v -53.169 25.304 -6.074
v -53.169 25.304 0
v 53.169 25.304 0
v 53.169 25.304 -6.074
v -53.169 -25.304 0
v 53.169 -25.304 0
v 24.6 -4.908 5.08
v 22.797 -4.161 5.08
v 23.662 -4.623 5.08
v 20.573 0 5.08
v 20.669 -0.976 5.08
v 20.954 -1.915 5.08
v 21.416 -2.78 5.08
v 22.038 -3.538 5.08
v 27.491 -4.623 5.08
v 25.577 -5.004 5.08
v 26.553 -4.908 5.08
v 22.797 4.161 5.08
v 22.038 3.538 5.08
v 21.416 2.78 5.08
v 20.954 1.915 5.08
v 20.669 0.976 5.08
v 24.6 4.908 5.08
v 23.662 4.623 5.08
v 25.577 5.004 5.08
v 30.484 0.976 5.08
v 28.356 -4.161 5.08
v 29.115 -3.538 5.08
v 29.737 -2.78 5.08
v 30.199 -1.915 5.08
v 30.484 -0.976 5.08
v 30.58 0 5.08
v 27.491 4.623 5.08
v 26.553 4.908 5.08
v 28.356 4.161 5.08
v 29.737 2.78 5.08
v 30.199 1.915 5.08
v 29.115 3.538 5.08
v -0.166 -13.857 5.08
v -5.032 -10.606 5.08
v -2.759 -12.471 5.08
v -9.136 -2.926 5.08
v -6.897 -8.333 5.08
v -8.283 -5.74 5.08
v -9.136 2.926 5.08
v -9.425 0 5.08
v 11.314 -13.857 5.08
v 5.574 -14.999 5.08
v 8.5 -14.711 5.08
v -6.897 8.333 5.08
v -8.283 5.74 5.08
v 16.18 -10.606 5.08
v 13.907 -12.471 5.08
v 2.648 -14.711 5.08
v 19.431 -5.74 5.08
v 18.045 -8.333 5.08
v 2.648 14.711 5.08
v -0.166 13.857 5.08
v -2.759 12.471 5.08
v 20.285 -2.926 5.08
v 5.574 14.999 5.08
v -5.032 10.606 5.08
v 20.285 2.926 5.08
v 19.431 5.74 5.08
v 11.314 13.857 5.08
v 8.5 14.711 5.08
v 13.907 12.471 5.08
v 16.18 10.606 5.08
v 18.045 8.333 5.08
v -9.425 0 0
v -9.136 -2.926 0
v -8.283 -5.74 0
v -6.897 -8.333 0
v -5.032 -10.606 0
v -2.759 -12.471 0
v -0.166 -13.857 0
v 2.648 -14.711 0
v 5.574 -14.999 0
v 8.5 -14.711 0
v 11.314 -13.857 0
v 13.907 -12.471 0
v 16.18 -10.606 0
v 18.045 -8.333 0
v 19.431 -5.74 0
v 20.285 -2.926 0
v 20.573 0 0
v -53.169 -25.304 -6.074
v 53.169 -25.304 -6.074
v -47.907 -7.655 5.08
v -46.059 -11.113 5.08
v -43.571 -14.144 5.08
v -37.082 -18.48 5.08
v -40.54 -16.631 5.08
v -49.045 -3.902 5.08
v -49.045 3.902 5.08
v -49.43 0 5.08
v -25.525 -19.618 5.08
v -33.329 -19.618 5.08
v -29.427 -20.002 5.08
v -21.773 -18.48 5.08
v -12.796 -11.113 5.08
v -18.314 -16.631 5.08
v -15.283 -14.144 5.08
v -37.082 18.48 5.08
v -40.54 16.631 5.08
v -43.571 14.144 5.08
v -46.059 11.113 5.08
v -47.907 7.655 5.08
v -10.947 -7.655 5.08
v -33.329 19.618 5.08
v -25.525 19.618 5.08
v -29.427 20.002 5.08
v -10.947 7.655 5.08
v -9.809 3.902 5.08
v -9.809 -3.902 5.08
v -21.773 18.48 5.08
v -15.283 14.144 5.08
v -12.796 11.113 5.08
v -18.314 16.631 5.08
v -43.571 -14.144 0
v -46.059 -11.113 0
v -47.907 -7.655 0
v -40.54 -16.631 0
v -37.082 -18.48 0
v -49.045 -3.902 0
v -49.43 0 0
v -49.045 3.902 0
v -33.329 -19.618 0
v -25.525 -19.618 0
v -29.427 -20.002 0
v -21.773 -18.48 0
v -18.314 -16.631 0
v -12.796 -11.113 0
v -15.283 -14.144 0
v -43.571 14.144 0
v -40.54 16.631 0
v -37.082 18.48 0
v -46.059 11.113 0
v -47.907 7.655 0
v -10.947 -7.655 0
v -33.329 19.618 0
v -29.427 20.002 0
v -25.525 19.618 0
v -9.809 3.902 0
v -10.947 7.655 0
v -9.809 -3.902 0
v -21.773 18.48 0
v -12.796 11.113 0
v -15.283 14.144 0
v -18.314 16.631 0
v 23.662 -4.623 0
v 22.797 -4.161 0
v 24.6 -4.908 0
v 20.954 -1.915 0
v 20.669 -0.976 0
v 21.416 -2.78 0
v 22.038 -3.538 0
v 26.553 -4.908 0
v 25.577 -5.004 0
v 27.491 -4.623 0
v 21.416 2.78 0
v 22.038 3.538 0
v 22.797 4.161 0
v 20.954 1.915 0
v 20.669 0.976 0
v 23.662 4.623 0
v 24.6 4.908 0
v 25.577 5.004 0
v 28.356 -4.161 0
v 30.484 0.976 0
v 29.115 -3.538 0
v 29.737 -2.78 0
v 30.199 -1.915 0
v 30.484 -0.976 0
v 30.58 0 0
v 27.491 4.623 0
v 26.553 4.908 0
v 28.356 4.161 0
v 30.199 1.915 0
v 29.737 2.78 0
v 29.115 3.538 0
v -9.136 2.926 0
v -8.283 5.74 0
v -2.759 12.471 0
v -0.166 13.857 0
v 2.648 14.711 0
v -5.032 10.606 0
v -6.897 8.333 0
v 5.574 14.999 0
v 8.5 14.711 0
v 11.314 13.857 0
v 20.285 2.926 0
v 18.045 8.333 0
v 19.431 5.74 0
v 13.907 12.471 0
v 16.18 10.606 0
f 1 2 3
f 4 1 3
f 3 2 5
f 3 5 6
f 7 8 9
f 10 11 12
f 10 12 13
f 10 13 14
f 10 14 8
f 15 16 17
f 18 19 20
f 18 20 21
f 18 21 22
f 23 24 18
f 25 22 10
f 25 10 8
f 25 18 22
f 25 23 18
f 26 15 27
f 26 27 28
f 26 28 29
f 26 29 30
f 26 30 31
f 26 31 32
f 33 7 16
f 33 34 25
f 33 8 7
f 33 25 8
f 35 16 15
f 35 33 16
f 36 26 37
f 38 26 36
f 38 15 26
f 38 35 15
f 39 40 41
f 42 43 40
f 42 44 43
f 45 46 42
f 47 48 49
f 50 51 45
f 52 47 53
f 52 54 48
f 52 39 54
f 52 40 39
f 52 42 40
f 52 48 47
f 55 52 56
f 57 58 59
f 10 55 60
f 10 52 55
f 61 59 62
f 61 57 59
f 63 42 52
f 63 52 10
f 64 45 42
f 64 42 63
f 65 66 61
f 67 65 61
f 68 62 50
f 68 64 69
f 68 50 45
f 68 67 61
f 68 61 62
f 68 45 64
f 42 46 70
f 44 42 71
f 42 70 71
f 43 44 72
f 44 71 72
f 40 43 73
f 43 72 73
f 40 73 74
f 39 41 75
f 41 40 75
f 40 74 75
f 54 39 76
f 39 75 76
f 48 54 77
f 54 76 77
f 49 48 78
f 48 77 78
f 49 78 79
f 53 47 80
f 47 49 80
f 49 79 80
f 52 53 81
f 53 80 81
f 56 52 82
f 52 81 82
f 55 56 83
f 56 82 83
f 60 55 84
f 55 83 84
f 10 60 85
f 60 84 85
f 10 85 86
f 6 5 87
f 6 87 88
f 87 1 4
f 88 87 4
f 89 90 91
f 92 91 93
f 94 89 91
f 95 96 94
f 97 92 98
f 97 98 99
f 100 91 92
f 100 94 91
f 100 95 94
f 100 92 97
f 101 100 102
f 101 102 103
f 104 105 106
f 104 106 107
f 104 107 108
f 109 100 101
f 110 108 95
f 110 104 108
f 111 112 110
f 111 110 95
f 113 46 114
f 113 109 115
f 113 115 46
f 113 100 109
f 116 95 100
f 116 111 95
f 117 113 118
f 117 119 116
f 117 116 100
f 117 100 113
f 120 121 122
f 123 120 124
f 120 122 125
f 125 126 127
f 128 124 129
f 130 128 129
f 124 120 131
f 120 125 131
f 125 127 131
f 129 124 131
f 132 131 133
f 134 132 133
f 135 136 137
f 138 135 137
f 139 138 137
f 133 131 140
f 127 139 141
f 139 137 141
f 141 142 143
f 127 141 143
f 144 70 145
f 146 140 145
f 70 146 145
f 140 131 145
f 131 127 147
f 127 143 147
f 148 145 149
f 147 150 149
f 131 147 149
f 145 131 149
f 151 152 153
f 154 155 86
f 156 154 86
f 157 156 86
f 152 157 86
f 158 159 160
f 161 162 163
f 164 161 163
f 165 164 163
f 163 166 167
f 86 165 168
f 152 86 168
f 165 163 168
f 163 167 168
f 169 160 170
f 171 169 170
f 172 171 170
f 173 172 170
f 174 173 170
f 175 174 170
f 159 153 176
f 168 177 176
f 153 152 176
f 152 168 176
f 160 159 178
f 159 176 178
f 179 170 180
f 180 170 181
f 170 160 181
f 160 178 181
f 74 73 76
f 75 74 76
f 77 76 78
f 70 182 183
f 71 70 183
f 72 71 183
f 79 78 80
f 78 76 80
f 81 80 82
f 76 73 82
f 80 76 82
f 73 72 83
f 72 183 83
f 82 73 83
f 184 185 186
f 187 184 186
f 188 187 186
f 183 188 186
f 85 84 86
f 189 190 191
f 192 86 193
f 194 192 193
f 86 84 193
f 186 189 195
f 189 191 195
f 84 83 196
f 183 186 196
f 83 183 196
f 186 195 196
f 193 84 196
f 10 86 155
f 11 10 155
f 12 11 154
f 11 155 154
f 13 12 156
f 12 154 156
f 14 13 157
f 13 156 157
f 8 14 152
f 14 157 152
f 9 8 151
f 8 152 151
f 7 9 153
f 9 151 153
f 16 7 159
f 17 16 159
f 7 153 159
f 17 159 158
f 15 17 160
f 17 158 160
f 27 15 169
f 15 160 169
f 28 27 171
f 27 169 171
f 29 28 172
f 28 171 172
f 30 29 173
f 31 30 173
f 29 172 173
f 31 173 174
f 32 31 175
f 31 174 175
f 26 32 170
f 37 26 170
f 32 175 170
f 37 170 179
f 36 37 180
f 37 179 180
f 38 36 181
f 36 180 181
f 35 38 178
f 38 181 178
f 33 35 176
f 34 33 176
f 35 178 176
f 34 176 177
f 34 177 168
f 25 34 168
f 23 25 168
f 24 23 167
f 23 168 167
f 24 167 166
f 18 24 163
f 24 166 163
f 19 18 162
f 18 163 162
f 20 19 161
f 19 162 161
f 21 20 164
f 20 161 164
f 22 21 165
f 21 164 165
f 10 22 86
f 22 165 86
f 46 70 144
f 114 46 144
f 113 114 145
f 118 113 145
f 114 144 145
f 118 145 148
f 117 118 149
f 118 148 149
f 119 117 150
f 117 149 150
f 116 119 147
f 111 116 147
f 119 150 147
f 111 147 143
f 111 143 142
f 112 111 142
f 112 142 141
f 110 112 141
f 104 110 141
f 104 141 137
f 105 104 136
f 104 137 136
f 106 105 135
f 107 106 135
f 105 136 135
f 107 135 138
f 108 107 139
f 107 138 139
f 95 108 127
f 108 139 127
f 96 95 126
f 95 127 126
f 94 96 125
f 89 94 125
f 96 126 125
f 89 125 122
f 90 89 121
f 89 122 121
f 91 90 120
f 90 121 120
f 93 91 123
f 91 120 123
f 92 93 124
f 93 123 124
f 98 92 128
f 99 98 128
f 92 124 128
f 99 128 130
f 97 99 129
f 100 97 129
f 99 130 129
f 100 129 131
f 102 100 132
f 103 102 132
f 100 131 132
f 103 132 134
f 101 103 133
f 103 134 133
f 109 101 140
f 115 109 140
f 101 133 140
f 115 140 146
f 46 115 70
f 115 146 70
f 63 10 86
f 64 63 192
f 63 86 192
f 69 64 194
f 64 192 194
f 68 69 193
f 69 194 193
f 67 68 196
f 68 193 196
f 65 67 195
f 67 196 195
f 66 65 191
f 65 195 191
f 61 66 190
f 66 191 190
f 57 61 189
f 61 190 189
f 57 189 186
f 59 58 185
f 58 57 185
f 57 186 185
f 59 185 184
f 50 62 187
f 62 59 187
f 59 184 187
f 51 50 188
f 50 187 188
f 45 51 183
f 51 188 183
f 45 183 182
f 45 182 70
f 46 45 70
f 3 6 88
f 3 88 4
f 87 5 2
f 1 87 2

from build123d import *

# Parameters (mm, degrees)
F1_R     = 20.0025
F2_DEPTH = 5.08
F0_W     = 106.338516
F0_H     = 50.608118
F3_DEPTH = 6.07379


with BuildPart() as f2:
    # F1 (on face) → F2 (new body)
    with BuildSketch(Plane.XY):
        with BuildLine():
            ThreePointArc((30.580322, 0), (25.576522, 5.0038), (20.572722, 0))
            ThreePointArc((20.572722, 0), (25.576522, -5.0038), (30.580322, 0))
        make_face()
        with BuildLine():
            ThreePointArc((20.572722, 0), (5.574022, 14.9987), (-9.424678, 0))
            ThreePointArc((-9.424678, 0), (5.574022, -14.9987), (20.572722, 0))
        make_face()
        with Locations((-29.427178, 0)):
            Circle(F1_R)
    extrude(amount=F2_DEPTH)


with BuildPart() as f3:
    # F0 (on Top) → F3 (new body)
    with BuildSketch(Plane.XY):
        Rectangle(F0_W, F0_H)
    extrude(amount=-F3_DEPTH)


solid = Compound([f2.part, f3.part])
